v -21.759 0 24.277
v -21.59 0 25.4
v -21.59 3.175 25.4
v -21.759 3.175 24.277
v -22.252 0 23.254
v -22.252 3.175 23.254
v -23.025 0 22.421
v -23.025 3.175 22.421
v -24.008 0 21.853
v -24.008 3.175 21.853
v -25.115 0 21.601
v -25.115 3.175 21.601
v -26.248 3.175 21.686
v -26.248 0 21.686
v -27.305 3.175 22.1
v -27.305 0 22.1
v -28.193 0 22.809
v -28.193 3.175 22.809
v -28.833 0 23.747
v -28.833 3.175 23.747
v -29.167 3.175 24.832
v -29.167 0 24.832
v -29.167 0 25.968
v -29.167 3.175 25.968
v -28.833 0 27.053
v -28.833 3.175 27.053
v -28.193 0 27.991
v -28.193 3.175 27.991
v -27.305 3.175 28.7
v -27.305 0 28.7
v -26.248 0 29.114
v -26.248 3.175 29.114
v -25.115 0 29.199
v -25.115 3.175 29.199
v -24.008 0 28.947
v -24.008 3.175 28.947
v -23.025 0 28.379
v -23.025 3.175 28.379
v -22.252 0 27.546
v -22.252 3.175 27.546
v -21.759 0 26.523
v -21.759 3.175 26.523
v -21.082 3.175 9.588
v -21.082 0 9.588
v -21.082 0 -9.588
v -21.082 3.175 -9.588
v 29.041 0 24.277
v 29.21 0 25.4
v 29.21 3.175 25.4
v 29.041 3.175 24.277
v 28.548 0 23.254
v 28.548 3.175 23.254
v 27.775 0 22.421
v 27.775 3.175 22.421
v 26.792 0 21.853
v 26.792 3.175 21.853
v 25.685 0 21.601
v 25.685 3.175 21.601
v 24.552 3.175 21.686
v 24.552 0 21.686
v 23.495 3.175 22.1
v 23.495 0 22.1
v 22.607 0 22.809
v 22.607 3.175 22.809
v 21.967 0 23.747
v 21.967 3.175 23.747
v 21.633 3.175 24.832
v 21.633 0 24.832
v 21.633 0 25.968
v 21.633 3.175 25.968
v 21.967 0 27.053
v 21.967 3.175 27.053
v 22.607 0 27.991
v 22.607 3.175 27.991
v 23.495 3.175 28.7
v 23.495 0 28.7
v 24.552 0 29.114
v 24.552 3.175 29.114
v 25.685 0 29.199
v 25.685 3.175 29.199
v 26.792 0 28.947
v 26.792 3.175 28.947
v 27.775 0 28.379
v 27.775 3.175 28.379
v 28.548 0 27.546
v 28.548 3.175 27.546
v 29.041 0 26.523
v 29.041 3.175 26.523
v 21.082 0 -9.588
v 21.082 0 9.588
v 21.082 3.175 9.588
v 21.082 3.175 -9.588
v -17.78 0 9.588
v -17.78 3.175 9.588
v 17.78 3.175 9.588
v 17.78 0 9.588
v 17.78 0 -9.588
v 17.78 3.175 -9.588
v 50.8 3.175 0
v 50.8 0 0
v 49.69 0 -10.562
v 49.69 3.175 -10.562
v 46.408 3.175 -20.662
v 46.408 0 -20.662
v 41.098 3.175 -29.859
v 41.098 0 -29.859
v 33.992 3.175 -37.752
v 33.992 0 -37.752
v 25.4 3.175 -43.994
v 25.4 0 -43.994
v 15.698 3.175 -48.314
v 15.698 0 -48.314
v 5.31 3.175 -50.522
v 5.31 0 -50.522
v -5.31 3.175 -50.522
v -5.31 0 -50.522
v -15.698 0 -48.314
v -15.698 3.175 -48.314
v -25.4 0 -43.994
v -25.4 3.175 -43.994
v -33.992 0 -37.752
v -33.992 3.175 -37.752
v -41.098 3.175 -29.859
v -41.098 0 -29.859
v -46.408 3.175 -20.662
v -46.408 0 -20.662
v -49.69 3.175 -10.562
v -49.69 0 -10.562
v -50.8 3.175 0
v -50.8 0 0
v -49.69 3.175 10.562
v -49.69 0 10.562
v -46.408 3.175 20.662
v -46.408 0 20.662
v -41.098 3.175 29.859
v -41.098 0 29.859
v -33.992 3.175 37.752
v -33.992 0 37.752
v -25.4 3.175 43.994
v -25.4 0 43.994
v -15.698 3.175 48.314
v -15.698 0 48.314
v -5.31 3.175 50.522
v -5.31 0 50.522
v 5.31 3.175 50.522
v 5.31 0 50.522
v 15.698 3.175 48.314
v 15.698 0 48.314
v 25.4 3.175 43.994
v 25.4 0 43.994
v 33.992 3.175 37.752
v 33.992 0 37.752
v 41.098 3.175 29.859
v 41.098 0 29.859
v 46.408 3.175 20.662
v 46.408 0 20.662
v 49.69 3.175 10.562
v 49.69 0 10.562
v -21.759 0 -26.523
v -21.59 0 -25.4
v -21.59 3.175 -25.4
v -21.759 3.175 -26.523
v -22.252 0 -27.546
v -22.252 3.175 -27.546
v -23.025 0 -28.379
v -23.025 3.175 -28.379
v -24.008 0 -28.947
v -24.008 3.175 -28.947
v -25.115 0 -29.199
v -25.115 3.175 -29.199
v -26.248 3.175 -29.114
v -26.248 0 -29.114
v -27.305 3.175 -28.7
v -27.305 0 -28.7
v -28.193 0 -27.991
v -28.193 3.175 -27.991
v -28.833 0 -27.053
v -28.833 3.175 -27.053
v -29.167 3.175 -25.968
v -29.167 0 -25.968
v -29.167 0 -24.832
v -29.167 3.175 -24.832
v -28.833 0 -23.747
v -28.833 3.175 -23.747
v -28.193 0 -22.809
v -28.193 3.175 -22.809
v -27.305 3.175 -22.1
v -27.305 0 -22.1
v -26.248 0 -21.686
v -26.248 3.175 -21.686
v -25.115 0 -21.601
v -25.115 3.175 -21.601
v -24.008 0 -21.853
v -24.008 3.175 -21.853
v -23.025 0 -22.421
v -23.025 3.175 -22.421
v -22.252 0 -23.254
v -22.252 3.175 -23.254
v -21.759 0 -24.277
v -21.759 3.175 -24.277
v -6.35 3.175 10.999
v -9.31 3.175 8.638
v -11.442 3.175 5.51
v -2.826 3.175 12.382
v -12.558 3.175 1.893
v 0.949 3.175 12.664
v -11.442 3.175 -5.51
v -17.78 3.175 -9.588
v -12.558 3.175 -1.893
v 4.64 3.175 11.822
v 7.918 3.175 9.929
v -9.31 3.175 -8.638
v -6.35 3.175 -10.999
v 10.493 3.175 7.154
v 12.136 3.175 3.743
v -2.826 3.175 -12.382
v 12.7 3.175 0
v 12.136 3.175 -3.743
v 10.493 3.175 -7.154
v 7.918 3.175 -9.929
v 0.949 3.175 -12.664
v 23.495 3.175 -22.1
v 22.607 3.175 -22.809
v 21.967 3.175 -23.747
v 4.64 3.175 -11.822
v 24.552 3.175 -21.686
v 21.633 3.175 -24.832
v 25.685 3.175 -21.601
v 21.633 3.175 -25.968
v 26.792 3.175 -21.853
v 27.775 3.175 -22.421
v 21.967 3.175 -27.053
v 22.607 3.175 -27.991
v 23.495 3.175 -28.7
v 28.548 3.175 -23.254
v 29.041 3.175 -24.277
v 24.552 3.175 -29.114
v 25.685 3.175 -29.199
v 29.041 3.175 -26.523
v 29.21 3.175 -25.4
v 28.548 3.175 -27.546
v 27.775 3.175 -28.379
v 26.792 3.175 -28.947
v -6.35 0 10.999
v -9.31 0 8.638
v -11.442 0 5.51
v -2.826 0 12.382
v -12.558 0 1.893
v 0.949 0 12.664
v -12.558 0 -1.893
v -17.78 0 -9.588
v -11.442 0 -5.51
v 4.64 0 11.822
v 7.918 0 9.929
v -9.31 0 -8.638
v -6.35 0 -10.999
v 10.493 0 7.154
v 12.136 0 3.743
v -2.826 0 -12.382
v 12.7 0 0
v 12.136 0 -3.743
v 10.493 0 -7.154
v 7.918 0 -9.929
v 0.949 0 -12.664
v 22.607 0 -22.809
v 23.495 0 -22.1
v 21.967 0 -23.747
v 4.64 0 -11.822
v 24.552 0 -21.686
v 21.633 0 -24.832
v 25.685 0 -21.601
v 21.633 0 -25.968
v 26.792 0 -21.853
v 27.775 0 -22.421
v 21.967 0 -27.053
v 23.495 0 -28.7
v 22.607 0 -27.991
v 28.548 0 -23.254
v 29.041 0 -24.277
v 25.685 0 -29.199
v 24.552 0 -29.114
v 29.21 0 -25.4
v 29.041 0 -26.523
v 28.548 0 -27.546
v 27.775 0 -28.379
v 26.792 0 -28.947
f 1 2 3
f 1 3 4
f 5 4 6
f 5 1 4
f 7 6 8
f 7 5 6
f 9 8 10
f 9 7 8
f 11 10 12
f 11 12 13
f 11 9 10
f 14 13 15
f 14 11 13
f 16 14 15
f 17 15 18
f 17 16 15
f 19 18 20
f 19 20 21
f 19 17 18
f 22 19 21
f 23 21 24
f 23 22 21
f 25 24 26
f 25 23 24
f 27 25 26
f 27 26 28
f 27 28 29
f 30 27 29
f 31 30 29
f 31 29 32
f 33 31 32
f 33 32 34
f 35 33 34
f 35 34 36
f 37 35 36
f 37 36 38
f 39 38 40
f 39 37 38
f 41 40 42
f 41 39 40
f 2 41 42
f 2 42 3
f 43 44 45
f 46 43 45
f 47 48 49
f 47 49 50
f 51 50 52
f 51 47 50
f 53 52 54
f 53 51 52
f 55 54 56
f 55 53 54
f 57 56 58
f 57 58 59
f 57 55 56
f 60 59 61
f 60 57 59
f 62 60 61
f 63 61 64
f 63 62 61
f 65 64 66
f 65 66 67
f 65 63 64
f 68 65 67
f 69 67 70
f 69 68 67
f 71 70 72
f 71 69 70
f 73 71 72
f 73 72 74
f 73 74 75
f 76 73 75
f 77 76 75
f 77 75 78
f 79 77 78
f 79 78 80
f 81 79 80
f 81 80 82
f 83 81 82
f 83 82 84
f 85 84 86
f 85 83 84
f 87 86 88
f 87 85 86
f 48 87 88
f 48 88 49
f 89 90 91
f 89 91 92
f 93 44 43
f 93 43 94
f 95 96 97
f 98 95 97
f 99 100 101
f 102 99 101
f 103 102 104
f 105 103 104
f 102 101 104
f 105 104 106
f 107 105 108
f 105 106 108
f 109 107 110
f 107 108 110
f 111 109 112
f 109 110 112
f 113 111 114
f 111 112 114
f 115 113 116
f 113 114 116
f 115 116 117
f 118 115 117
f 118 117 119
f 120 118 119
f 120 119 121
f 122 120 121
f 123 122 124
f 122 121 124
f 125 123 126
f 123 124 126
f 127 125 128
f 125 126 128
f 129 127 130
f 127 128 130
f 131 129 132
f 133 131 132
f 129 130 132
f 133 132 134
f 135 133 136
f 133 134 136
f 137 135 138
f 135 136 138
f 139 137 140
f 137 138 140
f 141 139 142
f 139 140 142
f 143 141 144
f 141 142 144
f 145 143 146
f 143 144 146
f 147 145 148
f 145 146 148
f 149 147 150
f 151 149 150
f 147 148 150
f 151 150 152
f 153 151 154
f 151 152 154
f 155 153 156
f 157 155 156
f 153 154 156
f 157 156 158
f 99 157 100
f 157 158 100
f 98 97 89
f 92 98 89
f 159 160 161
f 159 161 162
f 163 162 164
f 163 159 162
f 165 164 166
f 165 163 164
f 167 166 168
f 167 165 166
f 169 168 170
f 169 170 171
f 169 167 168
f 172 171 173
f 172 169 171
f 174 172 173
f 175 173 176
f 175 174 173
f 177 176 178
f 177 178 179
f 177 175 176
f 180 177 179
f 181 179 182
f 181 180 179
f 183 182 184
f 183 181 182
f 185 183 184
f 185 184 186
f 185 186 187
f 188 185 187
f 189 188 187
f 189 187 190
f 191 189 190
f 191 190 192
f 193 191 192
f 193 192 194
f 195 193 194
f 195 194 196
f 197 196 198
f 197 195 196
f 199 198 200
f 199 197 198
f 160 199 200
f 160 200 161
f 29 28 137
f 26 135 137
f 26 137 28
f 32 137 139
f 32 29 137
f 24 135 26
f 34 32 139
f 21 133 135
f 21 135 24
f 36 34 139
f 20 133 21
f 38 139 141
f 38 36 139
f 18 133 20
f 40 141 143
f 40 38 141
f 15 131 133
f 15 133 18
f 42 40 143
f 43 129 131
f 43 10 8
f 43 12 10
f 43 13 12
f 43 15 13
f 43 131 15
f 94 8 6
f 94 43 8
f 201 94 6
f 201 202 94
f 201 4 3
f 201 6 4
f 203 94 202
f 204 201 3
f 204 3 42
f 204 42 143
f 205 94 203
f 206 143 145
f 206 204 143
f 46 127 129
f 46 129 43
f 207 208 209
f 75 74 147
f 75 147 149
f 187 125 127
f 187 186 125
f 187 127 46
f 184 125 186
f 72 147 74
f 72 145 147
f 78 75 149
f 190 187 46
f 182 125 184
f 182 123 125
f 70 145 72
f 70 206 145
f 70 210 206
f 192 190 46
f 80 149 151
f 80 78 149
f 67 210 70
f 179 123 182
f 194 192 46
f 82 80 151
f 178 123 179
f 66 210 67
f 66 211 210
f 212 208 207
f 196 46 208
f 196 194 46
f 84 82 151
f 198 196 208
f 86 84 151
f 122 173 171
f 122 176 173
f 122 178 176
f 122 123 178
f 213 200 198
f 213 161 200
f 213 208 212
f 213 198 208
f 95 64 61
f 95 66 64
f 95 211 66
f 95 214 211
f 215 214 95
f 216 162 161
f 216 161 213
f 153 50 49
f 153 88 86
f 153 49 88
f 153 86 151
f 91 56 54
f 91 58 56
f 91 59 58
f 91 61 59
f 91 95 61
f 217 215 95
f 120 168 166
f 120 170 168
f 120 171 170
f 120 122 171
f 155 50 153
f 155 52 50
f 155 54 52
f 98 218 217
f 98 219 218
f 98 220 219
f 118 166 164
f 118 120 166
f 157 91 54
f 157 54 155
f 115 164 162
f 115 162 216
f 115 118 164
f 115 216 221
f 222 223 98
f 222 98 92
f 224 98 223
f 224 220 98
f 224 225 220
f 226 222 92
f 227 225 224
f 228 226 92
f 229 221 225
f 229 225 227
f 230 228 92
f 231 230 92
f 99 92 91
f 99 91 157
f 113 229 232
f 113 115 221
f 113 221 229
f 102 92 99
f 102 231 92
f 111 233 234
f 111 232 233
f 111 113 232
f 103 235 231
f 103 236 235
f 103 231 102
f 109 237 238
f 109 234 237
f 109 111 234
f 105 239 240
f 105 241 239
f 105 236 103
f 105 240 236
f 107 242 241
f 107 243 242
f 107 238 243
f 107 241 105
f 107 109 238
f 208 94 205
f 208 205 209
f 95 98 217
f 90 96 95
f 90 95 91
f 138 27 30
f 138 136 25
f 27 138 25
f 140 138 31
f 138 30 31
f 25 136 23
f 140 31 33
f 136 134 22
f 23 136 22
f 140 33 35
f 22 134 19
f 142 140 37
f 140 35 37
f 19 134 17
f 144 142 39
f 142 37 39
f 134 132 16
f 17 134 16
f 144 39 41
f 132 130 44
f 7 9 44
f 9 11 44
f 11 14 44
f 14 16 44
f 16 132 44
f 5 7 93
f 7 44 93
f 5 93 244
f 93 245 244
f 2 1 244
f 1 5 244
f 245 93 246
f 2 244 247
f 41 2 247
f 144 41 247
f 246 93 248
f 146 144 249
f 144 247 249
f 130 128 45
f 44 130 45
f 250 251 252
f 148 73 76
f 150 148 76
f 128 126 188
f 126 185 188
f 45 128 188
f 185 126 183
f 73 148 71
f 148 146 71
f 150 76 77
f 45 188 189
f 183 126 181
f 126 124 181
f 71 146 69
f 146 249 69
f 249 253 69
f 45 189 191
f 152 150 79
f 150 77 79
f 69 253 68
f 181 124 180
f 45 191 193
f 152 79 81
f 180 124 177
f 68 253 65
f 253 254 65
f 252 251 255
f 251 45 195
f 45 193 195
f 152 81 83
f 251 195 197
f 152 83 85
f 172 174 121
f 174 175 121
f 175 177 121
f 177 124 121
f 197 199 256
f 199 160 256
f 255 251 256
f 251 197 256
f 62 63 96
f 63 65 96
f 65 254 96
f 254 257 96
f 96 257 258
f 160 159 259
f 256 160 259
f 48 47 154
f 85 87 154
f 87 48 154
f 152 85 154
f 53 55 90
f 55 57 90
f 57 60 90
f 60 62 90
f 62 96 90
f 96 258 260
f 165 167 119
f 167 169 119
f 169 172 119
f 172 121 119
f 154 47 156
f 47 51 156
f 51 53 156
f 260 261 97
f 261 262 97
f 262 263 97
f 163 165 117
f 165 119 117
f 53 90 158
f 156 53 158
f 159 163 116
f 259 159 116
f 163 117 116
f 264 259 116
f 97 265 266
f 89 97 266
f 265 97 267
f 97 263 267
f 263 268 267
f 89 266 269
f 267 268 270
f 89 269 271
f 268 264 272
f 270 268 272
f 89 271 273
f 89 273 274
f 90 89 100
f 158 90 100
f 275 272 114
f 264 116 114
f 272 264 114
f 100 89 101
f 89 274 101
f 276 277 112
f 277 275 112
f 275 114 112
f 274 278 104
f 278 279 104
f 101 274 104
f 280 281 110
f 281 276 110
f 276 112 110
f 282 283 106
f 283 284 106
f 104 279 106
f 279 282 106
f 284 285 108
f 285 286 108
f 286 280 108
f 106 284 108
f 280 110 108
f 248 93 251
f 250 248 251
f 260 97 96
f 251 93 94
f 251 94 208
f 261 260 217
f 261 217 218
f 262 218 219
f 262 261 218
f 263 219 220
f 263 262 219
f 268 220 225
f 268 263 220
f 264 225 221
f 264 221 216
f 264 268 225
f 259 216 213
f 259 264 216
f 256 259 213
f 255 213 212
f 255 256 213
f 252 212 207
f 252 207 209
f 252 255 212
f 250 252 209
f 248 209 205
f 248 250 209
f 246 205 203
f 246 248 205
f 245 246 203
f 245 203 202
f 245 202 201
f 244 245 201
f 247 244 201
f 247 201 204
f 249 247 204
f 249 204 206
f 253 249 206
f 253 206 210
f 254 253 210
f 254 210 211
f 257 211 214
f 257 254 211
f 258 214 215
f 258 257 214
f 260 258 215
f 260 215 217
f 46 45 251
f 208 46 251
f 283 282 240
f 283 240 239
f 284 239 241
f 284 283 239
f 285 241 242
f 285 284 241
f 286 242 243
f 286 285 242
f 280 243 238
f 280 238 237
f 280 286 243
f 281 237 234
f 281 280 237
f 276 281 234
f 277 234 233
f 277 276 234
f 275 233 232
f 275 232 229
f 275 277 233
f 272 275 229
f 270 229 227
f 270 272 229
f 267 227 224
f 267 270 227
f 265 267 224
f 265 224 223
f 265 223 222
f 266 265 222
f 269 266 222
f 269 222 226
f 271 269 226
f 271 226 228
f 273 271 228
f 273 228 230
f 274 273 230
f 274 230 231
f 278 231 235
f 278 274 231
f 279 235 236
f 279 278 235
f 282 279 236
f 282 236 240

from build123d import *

# Parameters (mm, degrees)
SKETCH1_R           = 50.8
SKETCH1_R_2         = 3.81
SKETCH1_R_3         = 12.7
SKETCH1_W           = 3.302
SKETCH1_H           = 19.177
BOSS_EXTRUDE1_DEPTH = 3.175


with BuildPart() as part:
    # Sketch1 → Boss-Extrude1 (new body)
    with BuildSketch(Plane(origin=(0, 0, 0), x_dir=(1, 0, 0), z_dir=(0, 1, 0))):
        Circle(SKETCH1_R)
        with Locations((-25.4, 25.4)):
            Circle(SKETCH1_R_2, mode=Mode.SUBTRACT)
        with Locations((-25.4, -25.4)):
            Circle(SKETCH1_R_2, mode=Mode.SUBTRACT)
        with Locations((25.4, -25.4)):
            Circle(SKETCH1_R_2, mode=Mode.SUBTRACT)
        with Locations((25.4, 25.4)):
            Circle(SKETCH1_R_2, mode=Mode.SUBTRACT)
        Circle(SKETCH1_R_3, mode=Mode.SUBTRACT)
        with Locations((19.431, 0)):
            Rectangle(SKETCH1_W, SKETCH1_H, mode=Mode.SUBTRACT)
        with Locations((-19.431, 0)):
            Rectangle(SKETCH1_W, SKETCH1_H, mode=Mode.SUBTRACT)
    extrude(amount=BOSS_EXTRUDE1_DEPTH)


solid = part.part
